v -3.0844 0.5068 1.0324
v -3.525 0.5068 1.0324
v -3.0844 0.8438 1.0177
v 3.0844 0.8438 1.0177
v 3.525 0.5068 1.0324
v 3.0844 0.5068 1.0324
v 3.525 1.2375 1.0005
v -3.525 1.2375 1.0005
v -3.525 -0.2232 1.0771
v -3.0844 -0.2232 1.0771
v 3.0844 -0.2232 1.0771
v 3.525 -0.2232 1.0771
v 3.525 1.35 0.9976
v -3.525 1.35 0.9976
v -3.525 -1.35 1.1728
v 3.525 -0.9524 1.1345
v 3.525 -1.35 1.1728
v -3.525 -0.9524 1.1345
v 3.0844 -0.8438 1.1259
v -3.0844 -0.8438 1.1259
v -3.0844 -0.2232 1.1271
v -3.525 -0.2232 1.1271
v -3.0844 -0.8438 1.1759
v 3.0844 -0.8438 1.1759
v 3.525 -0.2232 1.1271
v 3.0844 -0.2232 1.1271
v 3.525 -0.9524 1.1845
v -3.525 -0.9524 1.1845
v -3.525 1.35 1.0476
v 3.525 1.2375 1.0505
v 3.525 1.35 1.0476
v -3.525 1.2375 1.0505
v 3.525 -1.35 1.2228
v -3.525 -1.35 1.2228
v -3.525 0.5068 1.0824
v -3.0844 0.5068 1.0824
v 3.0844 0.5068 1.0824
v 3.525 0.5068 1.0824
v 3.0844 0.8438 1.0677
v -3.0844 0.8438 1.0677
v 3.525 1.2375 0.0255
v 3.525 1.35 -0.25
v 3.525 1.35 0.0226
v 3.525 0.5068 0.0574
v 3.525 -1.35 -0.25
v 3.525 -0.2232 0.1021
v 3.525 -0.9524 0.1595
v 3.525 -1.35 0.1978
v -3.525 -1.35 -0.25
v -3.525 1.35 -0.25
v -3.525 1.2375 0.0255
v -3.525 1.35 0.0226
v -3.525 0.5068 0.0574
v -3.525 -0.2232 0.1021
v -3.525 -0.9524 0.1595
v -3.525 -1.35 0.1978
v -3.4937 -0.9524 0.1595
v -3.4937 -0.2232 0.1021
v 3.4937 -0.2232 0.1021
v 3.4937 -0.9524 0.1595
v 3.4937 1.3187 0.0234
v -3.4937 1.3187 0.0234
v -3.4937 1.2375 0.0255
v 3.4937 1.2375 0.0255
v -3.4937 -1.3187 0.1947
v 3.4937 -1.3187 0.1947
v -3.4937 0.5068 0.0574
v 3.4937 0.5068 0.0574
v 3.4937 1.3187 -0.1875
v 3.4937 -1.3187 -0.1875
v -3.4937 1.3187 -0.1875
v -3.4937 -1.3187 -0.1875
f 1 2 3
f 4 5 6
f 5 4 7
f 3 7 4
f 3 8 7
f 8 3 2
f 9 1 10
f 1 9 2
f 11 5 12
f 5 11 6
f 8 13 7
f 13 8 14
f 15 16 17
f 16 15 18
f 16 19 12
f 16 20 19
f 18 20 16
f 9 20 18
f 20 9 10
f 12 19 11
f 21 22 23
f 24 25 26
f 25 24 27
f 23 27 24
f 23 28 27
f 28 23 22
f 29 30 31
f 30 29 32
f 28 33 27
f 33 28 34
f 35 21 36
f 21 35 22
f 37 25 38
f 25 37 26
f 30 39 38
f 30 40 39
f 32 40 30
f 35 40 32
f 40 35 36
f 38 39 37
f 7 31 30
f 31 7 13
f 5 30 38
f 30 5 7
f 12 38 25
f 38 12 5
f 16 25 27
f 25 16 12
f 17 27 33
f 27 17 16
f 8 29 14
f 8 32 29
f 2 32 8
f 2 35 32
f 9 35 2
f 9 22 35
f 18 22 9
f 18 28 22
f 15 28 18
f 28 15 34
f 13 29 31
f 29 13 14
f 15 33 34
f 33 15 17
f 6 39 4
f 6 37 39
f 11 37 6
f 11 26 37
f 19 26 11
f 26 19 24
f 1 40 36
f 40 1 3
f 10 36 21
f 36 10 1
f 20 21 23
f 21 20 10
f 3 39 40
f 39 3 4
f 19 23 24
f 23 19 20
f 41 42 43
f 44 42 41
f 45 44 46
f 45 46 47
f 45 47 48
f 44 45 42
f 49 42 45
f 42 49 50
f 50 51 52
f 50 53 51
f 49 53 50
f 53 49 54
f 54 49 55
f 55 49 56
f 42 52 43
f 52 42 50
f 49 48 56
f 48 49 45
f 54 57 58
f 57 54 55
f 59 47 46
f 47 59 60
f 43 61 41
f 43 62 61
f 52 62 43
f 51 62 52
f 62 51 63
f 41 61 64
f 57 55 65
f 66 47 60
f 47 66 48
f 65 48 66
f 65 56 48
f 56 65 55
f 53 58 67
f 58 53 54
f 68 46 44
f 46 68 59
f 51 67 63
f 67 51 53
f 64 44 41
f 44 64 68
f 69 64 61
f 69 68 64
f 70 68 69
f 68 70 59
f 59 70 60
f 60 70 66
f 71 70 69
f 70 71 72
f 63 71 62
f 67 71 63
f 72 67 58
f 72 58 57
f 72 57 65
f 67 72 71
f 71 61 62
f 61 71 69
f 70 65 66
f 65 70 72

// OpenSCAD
module curve_cylinder (length, width, height, inscribed_sides)
{
    angle = 360 / inscribed_sides;
    side_length = sqrt(4*width*width + height*height);
    radius = 2*sin(90 - angle/2) * side_length / sin(angle);
    translate([0, width/2, radius]) rotate([0, 90, 0])
        cylinder(r=radius, h=length, $fn=360, center=true);
}

module faceplate_filled (length, width, height, thickness, inscribed_sides)
{
    translate([0, 0, thickness/2]) intersection()
    {
        cube ([length/2, width/2, height/2], center=true);
        difference()
        {
            translate([0, 0, -thickness])
                curve_cylinder (length=length,
                                width=width,
                                height=height,
                                inscribed_sides=inscribed_sides);
            
            curve_cylinder (length=length,
                            width=width,
                            height=height,
                            inscribed_sides=inscribed_sides);
        }
    }
}

module main_keys_hole (length, width, height, thickness, shell_thickness, inscribed_sides)
{
    hole_length = 7 * length/8;
    hole_width = 5 * width/8;
    intersection()
    {
        // TODO: Move this to the right spot
        cube([hole_length/2, hole_width/2, height + thickness], center=true);

        faceplate_filled (length = length,
                          width = width,
                          height = height,
                          thickness = thickness,
                          inscribed_sides = inscribed_sides);
    }
}

module faceplate (length, width, height, thickness, shell_thickness, inscribed_sides)
{
    difference()
    {
        faceplate_filled (length = length,
                          width = width,
                          height = height,
                          thickness = thickness,
                          inscribed_sides = inscribed_sides);
        main_keys_hole (length = length,
                        width = width,
                        height = height,
                        thickness = thickness,
                        shell_thickness = shell_thickness,
                        inscribed_sides = inscribed_sides);
    }
}


module case_filled (length, width, height, inscribed_sides)
{
    difference() 
    {
        cube ([length/2, width/2, height/2], center=true);
        curve_cylinder (length=length,
                        width=width,
                        height=height,
                        inscribed_sides=inscribed_sides);
    }
}

module case (length, width, height, inscribed_sides, shell_thickness)
{
    difference()
    {
        case_filled (length=length,
                     width=width,
                     height=height,
                     inscribed_sides=inscribed_sides);

        translate([0, 0, shell_thickness / 2])
            case_filled (length = (length - shell_thickness),
                         width = (width - shell_thickness),
                         height = height,
                         inscribed_sides = inscribed_sides);
    }
}

module keyboard (length=14.1,
                 width=5.4,
                 height=1.0,
                 inscribed_sides=12,
                 faceplate_thickness=0.05,
                 shell_thickness=0.125,
                 fkeys=true)
{
    translate([0, 0, 1]) color([1, 0, 0])
        faceplate (length = length,
                   width = width,
                   height = height,
                   thickness = faceplate_thickness,
                   shell_thickness = shell_thickness,
                   inscribed_sides = inscribed_sides);
    
    case(length = length,
             width = width,
             height = height,
             inscribed_sides = inscribed_sides,
             shell_thickness=shell_thickness);
}

keyboard ();
